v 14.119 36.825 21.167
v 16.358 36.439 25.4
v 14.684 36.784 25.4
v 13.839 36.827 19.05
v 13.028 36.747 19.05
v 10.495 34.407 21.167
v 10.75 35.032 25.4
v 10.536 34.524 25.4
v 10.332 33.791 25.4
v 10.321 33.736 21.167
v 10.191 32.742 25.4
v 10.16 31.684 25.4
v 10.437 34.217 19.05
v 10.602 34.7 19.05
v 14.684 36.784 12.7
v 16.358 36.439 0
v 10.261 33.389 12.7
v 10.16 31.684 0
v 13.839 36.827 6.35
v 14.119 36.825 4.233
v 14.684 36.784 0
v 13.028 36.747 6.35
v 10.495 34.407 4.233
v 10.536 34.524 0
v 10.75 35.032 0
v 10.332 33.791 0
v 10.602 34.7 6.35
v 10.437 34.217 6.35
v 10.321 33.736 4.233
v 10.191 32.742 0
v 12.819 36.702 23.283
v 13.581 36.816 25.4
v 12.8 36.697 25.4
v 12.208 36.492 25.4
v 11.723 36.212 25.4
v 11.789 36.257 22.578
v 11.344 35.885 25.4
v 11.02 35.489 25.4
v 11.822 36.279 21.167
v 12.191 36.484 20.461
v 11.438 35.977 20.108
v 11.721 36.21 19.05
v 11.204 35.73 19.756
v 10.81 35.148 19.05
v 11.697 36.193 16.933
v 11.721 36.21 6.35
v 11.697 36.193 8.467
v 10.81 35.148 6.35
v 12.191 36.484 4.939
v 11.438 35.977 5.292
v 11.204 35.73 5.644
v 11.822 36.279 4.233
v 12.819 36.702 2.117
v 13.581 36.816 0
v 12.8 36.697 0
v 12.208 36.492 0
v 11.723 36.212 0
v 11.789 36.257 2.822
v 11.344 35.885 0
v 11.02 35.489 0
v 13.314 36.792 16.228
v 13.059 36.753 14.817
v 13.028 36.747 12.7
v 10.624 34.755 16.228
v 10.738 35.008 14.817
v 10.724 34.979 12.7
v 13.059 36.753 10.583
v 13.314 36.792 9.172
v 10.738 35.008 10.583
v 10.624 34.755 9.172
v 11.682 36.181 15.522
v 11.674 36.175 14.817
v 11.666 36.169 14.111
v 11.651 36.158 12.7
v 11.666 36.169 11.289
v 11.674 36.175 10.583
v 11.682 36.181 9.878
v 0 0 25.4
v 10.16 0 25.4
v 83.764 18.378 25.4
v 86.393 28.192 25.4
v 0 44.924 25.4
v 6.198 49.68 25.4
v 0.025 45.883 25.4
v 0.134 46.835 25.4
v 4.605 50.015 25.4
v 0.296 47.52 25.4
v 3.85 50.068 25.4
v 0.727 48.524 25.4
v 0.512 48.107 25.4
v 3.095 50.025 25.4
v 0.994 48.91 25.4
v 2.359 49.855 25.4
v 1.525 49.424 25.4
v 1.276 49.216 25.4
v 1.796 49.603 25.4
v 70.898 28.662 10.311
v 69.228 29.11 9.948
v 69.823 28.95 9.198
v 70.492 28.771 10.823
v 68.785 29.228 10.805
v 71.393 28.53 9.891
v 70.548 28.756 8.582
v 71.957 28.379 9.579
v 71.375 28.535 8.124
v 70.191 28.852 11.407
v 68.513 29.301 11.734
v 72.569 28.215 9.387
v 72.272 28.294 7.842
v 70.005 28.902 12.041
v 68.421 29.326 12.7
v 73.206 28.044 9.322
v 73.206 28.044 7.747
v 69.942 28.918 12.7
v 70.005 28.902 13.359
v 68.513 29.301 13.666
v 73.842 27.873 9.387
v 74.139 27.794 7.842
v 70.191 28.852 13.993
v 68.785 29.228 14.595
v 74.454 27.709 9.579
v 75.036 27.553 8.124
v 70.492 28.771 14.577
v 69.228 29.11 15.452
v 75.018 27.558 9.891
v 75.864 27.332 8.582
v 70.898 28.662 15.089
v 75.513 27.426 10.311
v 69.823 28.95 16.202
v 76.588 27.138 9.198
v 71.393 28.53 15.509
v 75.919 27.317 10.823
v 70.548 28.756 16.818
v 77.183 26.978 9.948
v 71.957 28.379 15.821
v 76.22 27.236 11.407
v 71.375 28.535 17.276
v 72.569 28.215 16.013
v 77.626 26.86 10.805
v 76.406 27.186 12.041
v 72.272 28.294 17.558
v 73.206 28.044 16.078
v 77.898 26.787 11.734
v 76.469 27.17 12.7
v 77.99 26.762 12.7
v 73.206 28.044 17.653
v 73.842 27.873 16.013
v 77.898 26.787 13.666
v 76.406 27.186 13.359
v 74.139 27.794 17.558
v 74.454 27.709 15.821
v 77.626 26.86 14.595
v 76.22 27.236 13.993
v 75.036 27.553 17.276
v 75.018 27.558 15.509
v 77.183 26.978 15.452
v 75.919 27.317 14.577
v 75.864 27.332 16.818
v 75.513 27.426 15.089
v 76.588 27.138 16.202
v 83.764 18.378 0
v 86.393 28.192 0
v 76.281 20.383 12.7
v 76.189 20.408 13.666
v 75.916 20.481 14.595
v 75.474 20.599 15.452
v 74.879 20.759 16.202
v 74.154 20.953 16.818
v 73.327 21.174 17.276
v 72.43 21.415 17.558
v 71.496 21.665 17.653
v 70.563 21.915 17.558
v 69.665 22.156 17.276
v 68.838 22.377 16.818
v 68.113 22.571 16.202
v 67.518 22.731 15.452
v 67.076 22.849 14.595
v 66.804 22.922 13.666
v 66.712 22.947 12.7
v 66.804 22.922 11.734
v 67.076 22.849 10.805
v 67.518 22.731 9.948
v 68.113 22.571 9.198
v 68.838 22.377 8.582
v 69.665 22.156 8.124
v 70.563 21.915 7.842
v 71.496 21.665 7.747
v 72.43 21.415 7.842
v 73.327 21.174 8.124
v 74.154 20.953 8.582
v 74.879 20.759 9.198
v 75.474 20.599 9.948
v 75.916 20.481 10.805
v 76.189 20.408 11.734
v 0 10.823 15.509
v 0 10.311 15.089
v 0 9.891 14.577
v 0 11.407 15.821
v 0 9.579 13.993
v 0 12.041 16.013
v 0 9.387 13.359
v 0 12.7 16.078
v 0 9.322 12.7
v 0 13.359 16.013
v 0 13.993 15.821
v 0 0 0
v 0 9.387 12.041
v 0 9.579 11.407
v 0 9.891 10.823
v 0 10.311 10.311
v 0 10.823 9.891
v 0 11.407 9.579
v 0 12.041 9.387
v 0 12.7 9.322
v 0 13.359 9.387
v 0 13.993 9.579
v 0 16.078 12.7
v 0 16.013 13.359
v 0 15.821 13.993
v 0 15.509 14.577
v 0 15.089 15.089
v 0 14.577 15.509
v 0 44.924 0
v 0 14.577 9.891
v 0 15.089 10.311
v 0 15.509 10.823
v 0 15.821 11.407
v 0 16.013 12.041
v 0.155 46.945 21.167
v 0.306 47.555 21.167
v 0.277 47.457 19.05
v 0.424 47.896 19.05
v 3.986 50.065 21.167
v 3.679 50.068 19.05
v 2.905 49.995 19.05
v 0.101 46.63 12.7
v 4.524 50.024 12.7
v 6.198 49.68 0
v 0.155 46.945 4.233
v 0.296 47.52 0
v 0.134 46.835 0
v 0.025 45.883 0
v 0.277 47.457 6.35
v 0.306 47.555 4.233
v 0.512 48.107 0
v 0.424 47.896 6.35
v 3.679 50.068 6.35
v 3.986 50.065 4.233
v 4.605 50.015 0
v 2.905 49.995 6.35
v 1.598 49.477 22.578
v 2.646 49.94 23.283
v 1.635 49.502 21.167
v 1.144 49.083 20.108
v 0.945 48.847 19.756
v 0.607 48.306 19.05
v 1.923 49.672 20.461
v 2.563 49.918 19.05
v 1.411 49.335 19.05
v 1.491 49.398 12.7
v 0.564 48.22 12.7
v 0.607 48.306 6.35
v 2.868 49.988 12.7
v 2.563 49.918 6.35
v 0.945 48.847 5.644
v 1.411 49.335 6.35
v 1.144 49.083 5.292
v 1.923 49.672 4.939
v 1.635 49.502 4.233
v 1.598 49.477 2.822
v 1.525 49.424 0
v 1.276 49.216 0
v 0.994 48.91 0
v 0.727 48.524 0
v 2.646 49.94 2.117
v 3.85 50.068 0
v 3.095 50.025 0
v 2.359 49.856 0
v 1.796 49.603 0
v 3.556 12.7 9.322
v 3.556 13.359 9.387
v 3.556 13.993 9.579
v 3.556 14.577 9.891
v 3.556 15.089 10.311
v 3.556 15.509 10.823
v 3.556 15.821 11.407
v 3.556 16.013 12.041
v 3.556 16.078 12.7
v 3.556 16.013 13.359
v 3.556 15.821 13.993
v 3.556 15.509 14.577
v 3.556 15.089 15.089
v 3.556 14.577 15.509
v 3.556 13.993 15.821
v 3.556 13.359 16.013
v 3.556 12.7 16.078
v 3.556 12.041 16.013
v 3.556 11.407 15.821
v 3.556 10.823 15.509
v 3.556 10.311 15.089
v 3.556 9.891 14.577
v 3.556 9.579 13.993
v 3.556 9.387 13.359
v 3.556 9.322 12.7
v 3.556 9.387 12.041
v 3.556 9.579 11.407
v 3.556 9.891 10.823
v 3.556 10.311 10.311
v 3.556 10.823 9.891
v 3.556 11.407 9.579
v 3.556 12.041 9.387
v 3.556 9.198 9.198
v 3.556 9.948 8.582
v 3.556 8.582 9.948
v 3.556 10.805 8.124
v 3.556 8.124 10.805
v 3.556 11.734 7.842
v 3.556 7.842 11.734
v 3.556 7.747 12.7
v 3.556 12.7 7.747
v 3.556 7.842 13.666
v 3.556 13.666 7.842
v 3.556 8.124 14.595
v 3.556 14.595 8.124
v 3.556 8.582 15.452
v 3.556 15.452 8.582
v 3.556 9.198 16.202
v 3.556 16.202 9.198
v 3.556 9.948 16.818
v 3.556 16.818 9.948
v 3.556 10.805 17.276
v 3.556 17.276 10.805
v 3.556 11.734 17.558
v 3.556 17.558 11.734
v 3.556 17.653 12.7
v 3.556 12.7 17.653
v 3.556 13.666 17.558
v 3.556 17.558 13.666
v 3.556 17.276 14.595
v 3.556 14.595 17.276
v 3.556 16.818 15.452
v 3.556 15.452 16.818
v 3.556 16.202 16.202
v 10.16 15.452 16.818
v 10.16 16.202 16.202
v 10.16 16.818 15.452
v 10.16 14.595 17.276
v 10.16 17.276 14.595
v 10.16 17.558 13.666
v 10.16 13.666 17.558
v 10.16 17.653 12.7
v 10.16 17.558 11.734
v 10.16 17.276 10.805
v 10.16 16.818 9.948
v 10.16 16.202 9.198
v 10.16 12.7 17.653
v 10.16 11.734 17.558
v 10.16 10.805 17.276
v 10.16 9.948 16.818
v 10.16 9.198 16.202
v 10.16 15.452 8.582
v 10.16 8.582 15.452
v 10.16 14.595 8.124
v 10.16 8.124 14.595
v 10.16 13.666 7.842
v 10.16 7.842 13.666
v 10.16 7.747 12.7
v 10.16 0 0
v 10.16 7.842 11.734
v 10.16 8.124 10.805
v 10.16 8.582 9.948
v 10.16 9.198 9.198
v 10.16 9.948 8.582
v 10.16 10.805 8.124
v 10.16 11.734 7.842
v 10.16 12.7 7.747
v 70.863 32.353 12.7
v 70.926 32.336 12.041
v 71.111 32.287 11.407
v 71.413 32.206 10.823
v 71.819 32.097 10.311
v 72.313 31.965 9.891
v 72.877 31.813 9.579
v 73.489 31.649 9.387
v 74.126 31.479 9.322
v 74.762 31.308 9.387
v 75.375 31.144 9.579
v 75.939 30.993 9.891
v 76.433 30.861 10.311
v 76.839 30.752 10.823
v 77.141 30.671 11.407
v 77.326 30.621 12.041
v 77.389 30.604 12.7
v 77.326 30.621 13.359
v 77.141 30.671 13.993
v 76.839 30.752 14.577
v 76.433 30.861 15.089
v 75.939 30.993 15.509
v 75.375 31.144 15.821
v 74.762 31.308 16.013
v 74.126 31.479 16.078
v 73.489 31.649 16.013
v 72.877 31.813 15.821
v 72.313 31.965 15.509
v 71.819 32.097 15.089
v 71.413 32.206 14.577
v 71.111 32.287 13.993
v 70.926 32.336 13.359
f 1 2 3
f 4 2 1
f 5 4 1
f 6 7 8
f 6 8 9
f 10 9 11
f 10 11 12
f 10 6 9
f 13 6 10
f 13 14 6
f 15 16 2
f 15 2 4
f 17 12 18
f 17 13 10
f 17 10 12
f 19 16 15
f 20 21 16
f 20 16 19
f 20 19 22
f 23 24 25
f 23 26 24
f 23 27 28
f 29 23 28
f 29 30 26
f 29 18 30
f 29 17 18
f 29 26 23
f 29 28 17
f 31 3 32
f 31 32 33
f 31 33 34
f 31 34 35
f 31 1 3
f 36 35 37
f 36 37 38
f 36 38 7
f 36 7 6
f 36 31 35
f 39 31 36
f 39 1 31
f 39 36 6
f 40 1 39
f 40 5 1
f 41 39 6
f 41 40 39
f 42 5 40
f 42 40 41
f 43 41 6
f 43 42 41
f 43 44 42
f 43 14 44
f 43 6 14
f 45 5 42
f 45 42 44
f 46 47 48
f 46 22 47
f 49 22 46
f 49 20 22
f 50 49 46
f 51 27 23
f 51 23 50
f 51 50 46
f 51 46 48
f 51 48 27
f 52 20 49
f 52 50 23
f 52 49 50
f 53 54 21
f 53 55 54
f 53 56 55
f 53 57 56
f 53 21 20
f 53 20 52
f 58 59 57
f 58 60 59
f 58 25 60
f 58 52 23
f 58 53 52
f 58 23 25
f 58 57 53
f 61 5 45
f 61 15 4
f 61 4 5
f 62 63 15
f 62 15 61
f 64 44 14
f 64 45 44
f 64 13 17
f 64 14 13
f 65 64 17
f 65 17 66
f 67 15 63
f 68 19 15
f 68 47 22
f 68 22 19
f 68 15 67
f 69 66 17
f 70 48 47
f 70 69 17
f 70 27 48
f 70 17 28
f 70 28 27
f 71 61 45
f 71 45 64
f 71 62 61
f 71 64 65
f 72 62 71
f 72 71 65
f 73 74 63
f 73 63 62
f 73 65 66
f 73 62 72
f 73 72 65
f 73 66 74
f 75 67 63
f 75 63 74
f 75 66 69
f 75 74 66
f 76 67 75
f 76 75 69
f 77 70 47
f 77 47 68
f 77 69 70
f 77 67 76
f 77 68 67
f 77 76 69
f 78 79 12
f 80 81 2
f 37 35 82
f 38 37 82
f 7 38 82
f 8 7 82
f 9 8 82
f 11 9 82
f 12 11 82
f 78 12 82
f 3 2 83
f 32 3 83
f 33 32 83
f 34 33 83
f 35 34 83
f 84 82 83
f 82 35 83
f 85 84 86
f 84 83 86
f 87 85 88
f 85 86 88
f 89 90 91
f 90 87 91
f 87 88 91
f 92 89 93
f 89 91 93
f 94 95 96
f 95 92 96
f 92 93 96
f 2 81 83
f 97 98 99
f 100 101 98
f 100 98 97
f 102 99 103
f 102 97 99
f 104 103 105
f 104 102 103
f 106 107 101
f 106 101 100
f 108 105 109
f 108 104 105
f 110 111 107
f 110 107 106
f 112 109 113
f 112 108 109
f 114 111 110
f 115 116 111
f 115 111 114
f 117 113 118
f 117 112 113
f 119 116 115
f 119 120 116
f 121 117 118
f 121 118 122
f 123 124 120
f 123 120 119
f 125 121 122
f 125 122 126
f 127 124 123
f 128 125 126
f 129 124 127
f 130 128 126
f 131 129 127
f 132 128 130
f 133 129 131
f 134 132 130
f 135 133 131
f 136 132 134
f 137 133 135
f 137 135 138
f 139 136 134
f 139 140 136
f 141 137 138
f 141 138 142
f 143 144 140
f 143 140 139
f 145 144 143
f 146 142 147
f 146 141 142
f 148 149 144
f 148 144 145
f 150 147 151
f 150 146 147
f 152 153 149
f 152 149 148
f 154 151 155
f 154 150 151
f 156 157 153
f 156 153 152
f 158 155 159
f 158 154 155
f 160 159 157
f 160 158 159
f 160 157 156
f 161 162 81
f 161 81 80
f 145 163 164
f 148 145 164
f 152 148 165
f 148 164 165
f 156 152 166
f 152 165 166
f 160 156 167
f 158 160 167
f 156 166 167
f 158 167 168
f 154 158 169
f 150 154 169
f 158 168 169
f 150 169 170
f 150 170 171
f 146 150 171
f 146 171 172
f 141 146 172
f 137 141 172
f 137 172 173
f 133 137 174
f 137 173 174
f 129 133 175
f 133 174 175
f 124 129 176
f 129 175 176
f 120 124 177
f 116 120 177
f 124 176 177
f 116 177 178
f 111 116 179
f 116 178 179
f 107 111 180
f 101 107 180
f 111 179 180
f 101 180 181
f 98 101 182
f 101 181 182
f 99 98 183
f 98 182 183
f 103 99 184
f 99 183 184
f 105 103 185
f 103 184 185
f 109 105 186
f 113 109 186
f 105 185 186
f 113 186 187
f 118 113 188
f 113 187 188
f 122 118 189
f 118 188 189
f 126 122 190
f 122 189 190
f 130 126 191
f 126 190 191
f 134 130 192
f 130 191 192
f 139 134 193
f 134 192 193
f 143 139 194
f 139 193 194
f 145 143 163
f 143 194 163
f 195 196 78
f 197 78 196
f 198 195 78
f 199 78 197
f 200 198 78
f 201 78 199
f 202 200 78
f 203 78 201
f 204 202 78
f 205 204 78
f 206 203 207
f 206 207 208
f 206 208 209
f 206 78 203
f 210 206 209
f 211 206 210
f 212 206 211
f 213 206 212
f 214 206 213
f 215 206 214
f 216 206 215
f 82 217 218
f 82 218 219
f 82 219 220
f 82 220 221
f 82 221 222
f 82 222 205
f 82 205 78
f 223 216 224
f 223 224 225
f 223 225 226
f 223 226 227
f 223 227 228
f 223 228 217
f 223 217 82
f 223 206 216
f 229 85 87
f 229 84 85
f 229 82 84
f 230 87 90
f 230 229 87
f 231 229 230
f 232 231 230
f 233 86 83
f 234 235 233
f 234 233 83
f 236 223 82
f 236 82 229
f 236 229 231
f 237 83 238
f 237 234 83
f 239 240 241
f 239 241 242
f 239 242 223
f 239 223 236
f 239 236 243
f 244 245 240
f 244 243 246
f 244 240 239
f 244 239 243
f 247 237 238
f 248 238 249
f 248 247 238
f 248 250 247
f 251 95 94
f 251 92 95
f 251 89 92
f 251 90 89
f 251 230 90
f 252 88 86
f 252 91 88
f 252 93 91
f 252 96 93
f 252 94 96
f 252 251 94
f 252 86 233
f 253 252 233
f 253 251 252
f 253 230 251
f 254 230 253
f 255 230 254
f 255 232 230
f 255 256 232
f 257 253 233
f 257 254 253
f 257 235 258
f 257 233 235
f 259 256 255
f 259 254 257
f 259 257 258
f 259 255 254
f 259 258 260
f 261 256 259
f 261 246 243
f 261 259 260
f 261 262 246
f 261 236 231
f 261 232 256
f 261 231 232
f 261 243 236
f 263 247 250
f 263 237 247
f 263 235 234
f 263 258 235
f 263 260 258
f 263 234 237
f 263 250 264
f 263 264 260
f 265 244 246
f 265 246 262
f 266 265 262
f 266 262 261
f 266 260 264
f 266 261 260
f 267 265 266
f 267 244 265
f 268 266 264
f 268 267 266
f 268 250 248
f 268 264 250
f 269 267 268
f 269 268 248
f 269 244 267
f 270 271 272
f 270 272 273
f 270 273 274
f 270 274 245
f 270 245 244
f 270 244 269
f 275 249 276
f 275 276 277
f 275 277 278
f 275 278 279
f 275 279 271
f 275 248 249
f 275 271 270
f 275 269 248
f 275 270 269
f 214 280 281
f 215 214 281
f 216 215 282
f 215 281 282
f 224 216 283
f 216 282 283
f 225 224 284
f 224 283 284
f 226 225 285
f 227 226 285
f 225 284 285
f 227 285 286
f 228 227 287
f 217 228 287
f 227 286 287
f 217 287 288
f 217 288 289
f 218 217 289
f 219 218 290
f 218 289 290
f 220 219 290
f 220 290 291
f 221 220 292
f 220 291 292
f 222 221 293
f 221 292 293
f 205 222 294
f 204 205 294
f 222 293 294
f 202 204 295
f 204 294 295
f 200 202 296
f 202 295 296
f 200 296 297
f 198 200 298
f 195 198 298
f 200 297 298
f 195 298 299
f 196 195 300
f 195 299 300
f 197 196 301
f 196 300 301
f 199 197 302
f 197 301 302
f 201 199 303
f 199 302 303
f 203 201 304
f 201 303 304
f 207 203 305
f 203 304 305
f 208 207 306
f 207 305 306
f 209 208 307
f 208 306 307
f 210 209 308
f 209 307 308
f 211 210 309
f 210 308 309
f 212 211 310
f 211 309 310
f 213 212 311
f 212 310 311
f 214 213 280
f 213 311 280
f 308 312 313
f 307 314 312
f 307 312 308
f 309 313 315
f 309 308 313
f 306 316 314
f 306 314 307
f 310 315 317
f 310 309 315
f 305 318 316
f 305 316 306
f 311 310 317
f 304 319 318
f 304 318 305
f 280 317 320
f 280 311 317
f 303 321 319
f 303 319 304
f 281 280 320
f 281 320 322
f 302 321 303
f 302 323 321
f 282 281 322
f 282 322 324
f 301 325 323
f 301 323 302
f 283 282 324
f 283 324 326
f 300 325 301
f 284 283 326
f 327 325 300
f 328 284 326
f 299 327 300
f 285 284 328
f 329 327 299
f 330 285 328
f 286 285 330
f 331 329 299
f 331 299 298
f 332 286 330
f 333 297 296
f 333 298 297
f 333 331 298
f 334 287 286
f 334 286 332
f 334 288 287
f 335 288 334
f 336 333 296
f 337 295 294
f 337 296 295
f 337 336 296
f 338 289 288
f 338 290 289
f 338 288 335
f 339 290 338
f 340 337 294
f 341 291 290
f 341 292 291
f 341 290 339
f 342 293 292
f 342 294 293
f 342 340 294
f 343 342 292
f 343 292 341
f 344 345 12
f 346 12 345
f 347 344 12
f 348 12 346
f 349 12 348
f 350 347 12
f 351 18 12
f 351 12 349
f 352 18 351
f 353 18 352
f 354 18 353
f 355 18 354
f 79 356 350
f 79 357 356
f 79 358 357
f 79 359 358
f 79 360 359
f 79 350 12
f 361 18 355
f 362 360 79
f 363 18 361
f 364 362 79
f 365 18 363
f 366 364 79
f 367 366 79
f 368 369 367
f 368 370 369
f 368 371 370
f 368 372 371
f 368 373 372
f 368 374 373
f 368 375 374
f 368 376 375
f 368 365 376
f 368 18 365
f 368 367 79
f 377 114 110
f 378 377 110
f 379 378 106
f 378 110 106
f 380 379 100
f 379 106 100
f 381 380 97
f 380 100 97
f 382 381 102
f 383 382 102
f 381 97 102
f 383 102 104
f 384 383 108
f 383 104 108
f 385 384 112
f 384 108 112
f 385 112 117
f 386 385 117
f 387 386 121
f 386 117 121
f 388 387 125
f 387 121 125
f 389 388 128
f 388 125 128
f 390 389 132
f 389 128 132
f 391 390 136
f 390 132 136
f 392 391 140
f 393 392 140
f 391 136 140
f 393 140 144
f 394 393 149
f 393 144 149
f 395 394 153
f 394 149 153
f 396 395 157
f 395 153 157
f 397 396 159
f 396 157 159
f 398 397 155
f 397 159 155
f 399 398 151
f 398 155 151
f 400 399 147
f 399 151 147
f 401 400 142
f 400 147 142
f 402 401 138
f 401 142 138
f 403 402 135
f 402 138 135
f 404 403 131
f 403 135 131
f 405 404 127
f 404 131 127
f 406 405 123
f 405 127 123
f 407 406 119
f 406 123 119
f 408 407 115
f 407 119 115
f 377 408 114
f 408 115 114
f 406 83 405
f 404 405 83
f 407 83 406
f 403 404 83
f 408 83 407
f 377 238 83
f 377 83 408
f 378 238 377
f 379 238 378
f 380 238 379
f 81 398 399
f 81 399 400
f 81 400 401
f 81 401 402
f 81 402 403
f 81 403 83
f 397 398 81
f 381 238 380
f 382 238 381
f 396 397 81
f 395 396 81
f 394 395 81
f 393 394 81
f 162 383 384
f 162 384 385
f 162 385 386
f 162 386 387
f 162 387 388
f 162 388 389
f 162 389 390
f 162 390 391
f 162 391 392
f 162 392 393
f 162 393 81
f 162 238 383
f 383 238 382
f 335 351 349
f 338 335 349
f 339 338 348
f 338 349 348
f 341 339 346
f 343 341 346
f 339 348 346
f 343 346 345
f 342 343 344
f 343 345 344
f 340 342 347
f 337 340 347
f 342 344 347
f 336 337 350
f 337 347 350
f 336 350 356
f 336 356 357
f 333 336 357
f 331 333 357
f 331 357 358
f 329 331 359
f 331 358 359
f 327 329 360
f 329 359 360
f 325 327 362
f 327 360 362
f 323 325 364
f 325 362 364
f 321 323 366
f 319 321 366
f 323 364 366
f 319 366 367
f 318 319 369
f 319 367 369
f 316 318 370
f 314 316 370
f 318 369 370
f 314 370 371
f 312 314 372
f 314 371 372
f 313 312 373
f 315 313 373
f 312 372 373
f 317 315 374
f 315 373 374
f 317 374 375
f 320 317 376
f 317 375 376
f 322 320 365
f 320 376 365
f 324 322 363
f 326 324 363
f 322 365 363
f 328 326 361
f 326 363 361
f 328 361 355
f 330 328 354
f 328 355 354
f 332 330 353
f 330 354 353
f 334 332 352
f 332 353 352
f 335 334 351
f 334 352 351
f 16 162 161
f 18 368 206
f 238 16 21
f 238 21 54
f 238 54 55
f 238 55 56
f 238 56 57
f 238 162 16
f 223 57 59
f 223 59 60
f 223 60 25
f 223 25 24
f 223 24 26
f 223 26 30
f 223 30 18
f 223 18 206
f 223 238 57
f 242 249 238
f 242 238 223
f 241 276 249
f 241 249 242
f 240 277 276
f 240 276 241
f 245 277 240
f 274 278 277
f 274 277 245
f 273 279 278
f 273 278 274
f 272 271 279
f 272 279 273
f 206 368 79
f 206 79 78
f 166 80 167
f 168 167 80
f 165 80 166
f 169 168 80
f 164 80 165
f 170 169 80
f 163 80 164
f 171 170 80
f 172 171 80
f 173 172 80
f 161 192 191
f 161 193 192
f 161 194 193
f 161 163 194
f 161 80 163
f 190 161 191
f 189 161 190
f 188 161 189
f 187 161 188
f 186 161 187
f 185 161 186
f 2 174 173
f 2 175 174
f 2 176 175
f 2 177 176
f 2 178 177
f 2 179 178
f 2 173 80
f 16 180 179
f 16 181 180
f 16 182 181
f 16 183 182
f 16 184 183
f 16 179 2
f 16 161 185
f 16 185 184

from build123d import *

# Parameters (mm, degrees)
BOSS_EXTRUDE1_DEPTH         = 25.4
F_1_4_CLEARANCE_HOLE1_D     = 6.7564
F_1_4_CLEARANCE_HOLE1_DEPTH = 10.16
F_1_4_CLEARANCE_HOLE1_TIP   = 2.029827343
F_1_4_CLEARANCE_HOLE2_D     = 6.7564
F_1_4_CLEARANCE_HOLE2_DEPTH = 10.16
F_1_4_CLEARANCE_HOLE2_TIP   = 2.029827343
SKETCH8_R                   = 4.953
CUT_EXTRUDE1_DEPTH          = 6.604
SKETCH9_R                   = 4.953
CUT_EXTRUDE2_DEPTH          = 6.604


with BuildPart() as part:
    # Sketch1 → Boss-Extrude1 (new body)
    with BuildSketch(Plane.XY):
        Polygon((10.16, 0), (0, 0), (0, 51.340769788), (86.393149461, 28.191795158), (83.763547963, 18.377988763), (10.16, 38.1), align=None)
    extrude(amount=BOSS_EXTRUDE1_DEPTH)

    # 1/4 Clearance Hole1
    with Locations(Plane.ZY):
        with Locations((12.7, 12.7)):
            Hole(F_1_4_CLEARANCE_HOLE1_D / 2, depth=F_1_4_CLEARANCE_HOLE1_DEPTH)
            with Locations((0, 0, -(F_1_4_CLEARANCE_HOLE1_DEPTH + F_1_4_CLEARANCE_HOLE1_TIP / 2))):  # 118° drill point
                Cone(0, F_1_4_CLEARANCE_HOLE1_D / 2, F_1_4_CLEARANCE_HOLE1_TIP, mode=Mode.SUBTRACT)

    # 1/4 Clearance Hole2
    with Locations(Plane(origin=(12.835192447, 47.901590337, 0), x_dir=(0.9659258262890674, -0.2588190451025242, 0), z_dir=(0.2588190451025242, 0.9659258262890674, 0))):
        with Locations((63.452800777, -12.7)):
            Hole(F_1_4_CLEARANCE_HOLE2_D / 2, depth=F_1_4_CLEARANCE_HOLE2_DEPTH)
            with Locations((0, 0, -(F_1_4_CLEARANCE_HOLE2_DEPTH + F_1_4_CLEARANCE_HOLE2_TIP / 2))):  # 118° drill point
                Cone(0, F_1_4_CLEARANCE_HOLE2_D / 2, F_1_4_CLEARANCE_HOLE2_TIP, mode=Mode.SUBTRACT)

    # Fillet1
    # a fillet whose section is not a circle: 5.08 mm, written as the material it adds along each edge (its section moved 0.00015 mm through the faces so that the kernel can cut it)
    with BuildSketch(Plane(origin=(10.16, 38.1, 0), x_dir=(0.9659316901800618, -0.25879715977168133, 0), z_dir=(0, 0, 1))) as fillet1_piece_1:
        with BuildLine():
            add(Edge.make_bspline([(6.620384896, 0), (5.560159502, 2.4022e-05), (4.499934108, 4.8044e-05), (2.201778974, -0.538520049), (1.089942696, -1.987425322), (1.164425276, -4.346667776), (1.438808597, -5.370773083), (1.713191917, -6.39487839)], knots=[0, 0, 0, 0, 0, 0, 0.5, 0.5, 1, 1, 1, 1, 1, 1], degree=5))
            Line((1.713191917, -6.39487839), (1.615053258, -6.421172181))
            ThreePointArc((1.615053258, -6.421172181), (0.758529744, -3.223713577), (-0.09813866, -0.026293791))
            Line((-0.09813866, -0.026293791), (2.302e-06, 0.1016))
            ThreePointArc((2.302e-06, 0.1016), (3.310194748, 0.101525), (6.620387198, 0.1016))
            Line((6.620387198, 0.1016), (6.620384896, 0))
        make_face()
    extrude(amount=25.4)
    # a fillet whose section is not a circle: 5.08 mm, written as the material it takes off along each edge (its section moved 0.00015 mm through the faces so that the kernel can cut it)
    with BuildSketch(Plane(origin=(0, 51.340769788, -16.550962239), x_dir=(-2.2657292946318672e-05, -0.9999999997433235, 0), z_dir=(0, 0, 1))) as fillet1_2_piece_1:
        with BuildLine():
            add(Edge.make_bspline([(6.620384896, 0), (5.560159502, -2.4022e-05), (4.499934108, -4.8044e-05), (2.201778974, 0.538520049), (1.089942696, 1.987425322), (1.164425276, 4.346667776), (1.438808597, 5.370773083), (1.713191917, 6.39487839)], knots=[0, 0, 0, 0, 0, 0, 0.5, 0.5, 1, 1, 1, 1, 1, 1], degree=5))
            Line((1.713191917, 6.39487839), (1.615053258, 6.421172181))
            ThreePointArc((1.615053258, 6.421172181), (0.758529744, 3.223713577), (-0.09813866, 0.026293791))
            Line((-0.09813866, 0.026293791), (2.302e-06, -0.1016))
            ThreePointArc((2.302e-06, -0.1016), (3.310194748, -0.101525), (6.620387198, -0.1016))
            Line((6.620387198, -0.1016), (6.620384896, 0))
        make_face()
    extrude(amount=58.501924479, mode=Mode.SUBTRACT)

    # Sketch8 → Cut-Extrude1 (cut)
    with BuildSketch(Plane(origin=(10.205590949, 38.087783942, 0), x_dir=(0.9659258262890673, -0.2588190451025246, 0), z_dir=(-0.2588190451025246, -0.9659258262890674, 0))):
        with Locations((63.452800777, 12.7)):
            Circle(SKETCH8_R)
    extrude(amount=-CUT_EXTRUDE1_DEPTH, mode=Mode.SUBTRACT)

    # Sketch9 → Cut-Extrude2 (cut)
    with BuildSketch(Plane(origin=(10.16, 0, 0), x_dir=(0, 0, -1), z_dir=(1, 0, 0))):
        with Locations(Location((-12.7, 12.7, 0), (0, 0, 90))):
            Circle(SKETCH9_R)
    extrude(amount=-CUT_EXTRUDE2_DEPTH, mode=Mode.SUBTRACT)


solid = part.part
